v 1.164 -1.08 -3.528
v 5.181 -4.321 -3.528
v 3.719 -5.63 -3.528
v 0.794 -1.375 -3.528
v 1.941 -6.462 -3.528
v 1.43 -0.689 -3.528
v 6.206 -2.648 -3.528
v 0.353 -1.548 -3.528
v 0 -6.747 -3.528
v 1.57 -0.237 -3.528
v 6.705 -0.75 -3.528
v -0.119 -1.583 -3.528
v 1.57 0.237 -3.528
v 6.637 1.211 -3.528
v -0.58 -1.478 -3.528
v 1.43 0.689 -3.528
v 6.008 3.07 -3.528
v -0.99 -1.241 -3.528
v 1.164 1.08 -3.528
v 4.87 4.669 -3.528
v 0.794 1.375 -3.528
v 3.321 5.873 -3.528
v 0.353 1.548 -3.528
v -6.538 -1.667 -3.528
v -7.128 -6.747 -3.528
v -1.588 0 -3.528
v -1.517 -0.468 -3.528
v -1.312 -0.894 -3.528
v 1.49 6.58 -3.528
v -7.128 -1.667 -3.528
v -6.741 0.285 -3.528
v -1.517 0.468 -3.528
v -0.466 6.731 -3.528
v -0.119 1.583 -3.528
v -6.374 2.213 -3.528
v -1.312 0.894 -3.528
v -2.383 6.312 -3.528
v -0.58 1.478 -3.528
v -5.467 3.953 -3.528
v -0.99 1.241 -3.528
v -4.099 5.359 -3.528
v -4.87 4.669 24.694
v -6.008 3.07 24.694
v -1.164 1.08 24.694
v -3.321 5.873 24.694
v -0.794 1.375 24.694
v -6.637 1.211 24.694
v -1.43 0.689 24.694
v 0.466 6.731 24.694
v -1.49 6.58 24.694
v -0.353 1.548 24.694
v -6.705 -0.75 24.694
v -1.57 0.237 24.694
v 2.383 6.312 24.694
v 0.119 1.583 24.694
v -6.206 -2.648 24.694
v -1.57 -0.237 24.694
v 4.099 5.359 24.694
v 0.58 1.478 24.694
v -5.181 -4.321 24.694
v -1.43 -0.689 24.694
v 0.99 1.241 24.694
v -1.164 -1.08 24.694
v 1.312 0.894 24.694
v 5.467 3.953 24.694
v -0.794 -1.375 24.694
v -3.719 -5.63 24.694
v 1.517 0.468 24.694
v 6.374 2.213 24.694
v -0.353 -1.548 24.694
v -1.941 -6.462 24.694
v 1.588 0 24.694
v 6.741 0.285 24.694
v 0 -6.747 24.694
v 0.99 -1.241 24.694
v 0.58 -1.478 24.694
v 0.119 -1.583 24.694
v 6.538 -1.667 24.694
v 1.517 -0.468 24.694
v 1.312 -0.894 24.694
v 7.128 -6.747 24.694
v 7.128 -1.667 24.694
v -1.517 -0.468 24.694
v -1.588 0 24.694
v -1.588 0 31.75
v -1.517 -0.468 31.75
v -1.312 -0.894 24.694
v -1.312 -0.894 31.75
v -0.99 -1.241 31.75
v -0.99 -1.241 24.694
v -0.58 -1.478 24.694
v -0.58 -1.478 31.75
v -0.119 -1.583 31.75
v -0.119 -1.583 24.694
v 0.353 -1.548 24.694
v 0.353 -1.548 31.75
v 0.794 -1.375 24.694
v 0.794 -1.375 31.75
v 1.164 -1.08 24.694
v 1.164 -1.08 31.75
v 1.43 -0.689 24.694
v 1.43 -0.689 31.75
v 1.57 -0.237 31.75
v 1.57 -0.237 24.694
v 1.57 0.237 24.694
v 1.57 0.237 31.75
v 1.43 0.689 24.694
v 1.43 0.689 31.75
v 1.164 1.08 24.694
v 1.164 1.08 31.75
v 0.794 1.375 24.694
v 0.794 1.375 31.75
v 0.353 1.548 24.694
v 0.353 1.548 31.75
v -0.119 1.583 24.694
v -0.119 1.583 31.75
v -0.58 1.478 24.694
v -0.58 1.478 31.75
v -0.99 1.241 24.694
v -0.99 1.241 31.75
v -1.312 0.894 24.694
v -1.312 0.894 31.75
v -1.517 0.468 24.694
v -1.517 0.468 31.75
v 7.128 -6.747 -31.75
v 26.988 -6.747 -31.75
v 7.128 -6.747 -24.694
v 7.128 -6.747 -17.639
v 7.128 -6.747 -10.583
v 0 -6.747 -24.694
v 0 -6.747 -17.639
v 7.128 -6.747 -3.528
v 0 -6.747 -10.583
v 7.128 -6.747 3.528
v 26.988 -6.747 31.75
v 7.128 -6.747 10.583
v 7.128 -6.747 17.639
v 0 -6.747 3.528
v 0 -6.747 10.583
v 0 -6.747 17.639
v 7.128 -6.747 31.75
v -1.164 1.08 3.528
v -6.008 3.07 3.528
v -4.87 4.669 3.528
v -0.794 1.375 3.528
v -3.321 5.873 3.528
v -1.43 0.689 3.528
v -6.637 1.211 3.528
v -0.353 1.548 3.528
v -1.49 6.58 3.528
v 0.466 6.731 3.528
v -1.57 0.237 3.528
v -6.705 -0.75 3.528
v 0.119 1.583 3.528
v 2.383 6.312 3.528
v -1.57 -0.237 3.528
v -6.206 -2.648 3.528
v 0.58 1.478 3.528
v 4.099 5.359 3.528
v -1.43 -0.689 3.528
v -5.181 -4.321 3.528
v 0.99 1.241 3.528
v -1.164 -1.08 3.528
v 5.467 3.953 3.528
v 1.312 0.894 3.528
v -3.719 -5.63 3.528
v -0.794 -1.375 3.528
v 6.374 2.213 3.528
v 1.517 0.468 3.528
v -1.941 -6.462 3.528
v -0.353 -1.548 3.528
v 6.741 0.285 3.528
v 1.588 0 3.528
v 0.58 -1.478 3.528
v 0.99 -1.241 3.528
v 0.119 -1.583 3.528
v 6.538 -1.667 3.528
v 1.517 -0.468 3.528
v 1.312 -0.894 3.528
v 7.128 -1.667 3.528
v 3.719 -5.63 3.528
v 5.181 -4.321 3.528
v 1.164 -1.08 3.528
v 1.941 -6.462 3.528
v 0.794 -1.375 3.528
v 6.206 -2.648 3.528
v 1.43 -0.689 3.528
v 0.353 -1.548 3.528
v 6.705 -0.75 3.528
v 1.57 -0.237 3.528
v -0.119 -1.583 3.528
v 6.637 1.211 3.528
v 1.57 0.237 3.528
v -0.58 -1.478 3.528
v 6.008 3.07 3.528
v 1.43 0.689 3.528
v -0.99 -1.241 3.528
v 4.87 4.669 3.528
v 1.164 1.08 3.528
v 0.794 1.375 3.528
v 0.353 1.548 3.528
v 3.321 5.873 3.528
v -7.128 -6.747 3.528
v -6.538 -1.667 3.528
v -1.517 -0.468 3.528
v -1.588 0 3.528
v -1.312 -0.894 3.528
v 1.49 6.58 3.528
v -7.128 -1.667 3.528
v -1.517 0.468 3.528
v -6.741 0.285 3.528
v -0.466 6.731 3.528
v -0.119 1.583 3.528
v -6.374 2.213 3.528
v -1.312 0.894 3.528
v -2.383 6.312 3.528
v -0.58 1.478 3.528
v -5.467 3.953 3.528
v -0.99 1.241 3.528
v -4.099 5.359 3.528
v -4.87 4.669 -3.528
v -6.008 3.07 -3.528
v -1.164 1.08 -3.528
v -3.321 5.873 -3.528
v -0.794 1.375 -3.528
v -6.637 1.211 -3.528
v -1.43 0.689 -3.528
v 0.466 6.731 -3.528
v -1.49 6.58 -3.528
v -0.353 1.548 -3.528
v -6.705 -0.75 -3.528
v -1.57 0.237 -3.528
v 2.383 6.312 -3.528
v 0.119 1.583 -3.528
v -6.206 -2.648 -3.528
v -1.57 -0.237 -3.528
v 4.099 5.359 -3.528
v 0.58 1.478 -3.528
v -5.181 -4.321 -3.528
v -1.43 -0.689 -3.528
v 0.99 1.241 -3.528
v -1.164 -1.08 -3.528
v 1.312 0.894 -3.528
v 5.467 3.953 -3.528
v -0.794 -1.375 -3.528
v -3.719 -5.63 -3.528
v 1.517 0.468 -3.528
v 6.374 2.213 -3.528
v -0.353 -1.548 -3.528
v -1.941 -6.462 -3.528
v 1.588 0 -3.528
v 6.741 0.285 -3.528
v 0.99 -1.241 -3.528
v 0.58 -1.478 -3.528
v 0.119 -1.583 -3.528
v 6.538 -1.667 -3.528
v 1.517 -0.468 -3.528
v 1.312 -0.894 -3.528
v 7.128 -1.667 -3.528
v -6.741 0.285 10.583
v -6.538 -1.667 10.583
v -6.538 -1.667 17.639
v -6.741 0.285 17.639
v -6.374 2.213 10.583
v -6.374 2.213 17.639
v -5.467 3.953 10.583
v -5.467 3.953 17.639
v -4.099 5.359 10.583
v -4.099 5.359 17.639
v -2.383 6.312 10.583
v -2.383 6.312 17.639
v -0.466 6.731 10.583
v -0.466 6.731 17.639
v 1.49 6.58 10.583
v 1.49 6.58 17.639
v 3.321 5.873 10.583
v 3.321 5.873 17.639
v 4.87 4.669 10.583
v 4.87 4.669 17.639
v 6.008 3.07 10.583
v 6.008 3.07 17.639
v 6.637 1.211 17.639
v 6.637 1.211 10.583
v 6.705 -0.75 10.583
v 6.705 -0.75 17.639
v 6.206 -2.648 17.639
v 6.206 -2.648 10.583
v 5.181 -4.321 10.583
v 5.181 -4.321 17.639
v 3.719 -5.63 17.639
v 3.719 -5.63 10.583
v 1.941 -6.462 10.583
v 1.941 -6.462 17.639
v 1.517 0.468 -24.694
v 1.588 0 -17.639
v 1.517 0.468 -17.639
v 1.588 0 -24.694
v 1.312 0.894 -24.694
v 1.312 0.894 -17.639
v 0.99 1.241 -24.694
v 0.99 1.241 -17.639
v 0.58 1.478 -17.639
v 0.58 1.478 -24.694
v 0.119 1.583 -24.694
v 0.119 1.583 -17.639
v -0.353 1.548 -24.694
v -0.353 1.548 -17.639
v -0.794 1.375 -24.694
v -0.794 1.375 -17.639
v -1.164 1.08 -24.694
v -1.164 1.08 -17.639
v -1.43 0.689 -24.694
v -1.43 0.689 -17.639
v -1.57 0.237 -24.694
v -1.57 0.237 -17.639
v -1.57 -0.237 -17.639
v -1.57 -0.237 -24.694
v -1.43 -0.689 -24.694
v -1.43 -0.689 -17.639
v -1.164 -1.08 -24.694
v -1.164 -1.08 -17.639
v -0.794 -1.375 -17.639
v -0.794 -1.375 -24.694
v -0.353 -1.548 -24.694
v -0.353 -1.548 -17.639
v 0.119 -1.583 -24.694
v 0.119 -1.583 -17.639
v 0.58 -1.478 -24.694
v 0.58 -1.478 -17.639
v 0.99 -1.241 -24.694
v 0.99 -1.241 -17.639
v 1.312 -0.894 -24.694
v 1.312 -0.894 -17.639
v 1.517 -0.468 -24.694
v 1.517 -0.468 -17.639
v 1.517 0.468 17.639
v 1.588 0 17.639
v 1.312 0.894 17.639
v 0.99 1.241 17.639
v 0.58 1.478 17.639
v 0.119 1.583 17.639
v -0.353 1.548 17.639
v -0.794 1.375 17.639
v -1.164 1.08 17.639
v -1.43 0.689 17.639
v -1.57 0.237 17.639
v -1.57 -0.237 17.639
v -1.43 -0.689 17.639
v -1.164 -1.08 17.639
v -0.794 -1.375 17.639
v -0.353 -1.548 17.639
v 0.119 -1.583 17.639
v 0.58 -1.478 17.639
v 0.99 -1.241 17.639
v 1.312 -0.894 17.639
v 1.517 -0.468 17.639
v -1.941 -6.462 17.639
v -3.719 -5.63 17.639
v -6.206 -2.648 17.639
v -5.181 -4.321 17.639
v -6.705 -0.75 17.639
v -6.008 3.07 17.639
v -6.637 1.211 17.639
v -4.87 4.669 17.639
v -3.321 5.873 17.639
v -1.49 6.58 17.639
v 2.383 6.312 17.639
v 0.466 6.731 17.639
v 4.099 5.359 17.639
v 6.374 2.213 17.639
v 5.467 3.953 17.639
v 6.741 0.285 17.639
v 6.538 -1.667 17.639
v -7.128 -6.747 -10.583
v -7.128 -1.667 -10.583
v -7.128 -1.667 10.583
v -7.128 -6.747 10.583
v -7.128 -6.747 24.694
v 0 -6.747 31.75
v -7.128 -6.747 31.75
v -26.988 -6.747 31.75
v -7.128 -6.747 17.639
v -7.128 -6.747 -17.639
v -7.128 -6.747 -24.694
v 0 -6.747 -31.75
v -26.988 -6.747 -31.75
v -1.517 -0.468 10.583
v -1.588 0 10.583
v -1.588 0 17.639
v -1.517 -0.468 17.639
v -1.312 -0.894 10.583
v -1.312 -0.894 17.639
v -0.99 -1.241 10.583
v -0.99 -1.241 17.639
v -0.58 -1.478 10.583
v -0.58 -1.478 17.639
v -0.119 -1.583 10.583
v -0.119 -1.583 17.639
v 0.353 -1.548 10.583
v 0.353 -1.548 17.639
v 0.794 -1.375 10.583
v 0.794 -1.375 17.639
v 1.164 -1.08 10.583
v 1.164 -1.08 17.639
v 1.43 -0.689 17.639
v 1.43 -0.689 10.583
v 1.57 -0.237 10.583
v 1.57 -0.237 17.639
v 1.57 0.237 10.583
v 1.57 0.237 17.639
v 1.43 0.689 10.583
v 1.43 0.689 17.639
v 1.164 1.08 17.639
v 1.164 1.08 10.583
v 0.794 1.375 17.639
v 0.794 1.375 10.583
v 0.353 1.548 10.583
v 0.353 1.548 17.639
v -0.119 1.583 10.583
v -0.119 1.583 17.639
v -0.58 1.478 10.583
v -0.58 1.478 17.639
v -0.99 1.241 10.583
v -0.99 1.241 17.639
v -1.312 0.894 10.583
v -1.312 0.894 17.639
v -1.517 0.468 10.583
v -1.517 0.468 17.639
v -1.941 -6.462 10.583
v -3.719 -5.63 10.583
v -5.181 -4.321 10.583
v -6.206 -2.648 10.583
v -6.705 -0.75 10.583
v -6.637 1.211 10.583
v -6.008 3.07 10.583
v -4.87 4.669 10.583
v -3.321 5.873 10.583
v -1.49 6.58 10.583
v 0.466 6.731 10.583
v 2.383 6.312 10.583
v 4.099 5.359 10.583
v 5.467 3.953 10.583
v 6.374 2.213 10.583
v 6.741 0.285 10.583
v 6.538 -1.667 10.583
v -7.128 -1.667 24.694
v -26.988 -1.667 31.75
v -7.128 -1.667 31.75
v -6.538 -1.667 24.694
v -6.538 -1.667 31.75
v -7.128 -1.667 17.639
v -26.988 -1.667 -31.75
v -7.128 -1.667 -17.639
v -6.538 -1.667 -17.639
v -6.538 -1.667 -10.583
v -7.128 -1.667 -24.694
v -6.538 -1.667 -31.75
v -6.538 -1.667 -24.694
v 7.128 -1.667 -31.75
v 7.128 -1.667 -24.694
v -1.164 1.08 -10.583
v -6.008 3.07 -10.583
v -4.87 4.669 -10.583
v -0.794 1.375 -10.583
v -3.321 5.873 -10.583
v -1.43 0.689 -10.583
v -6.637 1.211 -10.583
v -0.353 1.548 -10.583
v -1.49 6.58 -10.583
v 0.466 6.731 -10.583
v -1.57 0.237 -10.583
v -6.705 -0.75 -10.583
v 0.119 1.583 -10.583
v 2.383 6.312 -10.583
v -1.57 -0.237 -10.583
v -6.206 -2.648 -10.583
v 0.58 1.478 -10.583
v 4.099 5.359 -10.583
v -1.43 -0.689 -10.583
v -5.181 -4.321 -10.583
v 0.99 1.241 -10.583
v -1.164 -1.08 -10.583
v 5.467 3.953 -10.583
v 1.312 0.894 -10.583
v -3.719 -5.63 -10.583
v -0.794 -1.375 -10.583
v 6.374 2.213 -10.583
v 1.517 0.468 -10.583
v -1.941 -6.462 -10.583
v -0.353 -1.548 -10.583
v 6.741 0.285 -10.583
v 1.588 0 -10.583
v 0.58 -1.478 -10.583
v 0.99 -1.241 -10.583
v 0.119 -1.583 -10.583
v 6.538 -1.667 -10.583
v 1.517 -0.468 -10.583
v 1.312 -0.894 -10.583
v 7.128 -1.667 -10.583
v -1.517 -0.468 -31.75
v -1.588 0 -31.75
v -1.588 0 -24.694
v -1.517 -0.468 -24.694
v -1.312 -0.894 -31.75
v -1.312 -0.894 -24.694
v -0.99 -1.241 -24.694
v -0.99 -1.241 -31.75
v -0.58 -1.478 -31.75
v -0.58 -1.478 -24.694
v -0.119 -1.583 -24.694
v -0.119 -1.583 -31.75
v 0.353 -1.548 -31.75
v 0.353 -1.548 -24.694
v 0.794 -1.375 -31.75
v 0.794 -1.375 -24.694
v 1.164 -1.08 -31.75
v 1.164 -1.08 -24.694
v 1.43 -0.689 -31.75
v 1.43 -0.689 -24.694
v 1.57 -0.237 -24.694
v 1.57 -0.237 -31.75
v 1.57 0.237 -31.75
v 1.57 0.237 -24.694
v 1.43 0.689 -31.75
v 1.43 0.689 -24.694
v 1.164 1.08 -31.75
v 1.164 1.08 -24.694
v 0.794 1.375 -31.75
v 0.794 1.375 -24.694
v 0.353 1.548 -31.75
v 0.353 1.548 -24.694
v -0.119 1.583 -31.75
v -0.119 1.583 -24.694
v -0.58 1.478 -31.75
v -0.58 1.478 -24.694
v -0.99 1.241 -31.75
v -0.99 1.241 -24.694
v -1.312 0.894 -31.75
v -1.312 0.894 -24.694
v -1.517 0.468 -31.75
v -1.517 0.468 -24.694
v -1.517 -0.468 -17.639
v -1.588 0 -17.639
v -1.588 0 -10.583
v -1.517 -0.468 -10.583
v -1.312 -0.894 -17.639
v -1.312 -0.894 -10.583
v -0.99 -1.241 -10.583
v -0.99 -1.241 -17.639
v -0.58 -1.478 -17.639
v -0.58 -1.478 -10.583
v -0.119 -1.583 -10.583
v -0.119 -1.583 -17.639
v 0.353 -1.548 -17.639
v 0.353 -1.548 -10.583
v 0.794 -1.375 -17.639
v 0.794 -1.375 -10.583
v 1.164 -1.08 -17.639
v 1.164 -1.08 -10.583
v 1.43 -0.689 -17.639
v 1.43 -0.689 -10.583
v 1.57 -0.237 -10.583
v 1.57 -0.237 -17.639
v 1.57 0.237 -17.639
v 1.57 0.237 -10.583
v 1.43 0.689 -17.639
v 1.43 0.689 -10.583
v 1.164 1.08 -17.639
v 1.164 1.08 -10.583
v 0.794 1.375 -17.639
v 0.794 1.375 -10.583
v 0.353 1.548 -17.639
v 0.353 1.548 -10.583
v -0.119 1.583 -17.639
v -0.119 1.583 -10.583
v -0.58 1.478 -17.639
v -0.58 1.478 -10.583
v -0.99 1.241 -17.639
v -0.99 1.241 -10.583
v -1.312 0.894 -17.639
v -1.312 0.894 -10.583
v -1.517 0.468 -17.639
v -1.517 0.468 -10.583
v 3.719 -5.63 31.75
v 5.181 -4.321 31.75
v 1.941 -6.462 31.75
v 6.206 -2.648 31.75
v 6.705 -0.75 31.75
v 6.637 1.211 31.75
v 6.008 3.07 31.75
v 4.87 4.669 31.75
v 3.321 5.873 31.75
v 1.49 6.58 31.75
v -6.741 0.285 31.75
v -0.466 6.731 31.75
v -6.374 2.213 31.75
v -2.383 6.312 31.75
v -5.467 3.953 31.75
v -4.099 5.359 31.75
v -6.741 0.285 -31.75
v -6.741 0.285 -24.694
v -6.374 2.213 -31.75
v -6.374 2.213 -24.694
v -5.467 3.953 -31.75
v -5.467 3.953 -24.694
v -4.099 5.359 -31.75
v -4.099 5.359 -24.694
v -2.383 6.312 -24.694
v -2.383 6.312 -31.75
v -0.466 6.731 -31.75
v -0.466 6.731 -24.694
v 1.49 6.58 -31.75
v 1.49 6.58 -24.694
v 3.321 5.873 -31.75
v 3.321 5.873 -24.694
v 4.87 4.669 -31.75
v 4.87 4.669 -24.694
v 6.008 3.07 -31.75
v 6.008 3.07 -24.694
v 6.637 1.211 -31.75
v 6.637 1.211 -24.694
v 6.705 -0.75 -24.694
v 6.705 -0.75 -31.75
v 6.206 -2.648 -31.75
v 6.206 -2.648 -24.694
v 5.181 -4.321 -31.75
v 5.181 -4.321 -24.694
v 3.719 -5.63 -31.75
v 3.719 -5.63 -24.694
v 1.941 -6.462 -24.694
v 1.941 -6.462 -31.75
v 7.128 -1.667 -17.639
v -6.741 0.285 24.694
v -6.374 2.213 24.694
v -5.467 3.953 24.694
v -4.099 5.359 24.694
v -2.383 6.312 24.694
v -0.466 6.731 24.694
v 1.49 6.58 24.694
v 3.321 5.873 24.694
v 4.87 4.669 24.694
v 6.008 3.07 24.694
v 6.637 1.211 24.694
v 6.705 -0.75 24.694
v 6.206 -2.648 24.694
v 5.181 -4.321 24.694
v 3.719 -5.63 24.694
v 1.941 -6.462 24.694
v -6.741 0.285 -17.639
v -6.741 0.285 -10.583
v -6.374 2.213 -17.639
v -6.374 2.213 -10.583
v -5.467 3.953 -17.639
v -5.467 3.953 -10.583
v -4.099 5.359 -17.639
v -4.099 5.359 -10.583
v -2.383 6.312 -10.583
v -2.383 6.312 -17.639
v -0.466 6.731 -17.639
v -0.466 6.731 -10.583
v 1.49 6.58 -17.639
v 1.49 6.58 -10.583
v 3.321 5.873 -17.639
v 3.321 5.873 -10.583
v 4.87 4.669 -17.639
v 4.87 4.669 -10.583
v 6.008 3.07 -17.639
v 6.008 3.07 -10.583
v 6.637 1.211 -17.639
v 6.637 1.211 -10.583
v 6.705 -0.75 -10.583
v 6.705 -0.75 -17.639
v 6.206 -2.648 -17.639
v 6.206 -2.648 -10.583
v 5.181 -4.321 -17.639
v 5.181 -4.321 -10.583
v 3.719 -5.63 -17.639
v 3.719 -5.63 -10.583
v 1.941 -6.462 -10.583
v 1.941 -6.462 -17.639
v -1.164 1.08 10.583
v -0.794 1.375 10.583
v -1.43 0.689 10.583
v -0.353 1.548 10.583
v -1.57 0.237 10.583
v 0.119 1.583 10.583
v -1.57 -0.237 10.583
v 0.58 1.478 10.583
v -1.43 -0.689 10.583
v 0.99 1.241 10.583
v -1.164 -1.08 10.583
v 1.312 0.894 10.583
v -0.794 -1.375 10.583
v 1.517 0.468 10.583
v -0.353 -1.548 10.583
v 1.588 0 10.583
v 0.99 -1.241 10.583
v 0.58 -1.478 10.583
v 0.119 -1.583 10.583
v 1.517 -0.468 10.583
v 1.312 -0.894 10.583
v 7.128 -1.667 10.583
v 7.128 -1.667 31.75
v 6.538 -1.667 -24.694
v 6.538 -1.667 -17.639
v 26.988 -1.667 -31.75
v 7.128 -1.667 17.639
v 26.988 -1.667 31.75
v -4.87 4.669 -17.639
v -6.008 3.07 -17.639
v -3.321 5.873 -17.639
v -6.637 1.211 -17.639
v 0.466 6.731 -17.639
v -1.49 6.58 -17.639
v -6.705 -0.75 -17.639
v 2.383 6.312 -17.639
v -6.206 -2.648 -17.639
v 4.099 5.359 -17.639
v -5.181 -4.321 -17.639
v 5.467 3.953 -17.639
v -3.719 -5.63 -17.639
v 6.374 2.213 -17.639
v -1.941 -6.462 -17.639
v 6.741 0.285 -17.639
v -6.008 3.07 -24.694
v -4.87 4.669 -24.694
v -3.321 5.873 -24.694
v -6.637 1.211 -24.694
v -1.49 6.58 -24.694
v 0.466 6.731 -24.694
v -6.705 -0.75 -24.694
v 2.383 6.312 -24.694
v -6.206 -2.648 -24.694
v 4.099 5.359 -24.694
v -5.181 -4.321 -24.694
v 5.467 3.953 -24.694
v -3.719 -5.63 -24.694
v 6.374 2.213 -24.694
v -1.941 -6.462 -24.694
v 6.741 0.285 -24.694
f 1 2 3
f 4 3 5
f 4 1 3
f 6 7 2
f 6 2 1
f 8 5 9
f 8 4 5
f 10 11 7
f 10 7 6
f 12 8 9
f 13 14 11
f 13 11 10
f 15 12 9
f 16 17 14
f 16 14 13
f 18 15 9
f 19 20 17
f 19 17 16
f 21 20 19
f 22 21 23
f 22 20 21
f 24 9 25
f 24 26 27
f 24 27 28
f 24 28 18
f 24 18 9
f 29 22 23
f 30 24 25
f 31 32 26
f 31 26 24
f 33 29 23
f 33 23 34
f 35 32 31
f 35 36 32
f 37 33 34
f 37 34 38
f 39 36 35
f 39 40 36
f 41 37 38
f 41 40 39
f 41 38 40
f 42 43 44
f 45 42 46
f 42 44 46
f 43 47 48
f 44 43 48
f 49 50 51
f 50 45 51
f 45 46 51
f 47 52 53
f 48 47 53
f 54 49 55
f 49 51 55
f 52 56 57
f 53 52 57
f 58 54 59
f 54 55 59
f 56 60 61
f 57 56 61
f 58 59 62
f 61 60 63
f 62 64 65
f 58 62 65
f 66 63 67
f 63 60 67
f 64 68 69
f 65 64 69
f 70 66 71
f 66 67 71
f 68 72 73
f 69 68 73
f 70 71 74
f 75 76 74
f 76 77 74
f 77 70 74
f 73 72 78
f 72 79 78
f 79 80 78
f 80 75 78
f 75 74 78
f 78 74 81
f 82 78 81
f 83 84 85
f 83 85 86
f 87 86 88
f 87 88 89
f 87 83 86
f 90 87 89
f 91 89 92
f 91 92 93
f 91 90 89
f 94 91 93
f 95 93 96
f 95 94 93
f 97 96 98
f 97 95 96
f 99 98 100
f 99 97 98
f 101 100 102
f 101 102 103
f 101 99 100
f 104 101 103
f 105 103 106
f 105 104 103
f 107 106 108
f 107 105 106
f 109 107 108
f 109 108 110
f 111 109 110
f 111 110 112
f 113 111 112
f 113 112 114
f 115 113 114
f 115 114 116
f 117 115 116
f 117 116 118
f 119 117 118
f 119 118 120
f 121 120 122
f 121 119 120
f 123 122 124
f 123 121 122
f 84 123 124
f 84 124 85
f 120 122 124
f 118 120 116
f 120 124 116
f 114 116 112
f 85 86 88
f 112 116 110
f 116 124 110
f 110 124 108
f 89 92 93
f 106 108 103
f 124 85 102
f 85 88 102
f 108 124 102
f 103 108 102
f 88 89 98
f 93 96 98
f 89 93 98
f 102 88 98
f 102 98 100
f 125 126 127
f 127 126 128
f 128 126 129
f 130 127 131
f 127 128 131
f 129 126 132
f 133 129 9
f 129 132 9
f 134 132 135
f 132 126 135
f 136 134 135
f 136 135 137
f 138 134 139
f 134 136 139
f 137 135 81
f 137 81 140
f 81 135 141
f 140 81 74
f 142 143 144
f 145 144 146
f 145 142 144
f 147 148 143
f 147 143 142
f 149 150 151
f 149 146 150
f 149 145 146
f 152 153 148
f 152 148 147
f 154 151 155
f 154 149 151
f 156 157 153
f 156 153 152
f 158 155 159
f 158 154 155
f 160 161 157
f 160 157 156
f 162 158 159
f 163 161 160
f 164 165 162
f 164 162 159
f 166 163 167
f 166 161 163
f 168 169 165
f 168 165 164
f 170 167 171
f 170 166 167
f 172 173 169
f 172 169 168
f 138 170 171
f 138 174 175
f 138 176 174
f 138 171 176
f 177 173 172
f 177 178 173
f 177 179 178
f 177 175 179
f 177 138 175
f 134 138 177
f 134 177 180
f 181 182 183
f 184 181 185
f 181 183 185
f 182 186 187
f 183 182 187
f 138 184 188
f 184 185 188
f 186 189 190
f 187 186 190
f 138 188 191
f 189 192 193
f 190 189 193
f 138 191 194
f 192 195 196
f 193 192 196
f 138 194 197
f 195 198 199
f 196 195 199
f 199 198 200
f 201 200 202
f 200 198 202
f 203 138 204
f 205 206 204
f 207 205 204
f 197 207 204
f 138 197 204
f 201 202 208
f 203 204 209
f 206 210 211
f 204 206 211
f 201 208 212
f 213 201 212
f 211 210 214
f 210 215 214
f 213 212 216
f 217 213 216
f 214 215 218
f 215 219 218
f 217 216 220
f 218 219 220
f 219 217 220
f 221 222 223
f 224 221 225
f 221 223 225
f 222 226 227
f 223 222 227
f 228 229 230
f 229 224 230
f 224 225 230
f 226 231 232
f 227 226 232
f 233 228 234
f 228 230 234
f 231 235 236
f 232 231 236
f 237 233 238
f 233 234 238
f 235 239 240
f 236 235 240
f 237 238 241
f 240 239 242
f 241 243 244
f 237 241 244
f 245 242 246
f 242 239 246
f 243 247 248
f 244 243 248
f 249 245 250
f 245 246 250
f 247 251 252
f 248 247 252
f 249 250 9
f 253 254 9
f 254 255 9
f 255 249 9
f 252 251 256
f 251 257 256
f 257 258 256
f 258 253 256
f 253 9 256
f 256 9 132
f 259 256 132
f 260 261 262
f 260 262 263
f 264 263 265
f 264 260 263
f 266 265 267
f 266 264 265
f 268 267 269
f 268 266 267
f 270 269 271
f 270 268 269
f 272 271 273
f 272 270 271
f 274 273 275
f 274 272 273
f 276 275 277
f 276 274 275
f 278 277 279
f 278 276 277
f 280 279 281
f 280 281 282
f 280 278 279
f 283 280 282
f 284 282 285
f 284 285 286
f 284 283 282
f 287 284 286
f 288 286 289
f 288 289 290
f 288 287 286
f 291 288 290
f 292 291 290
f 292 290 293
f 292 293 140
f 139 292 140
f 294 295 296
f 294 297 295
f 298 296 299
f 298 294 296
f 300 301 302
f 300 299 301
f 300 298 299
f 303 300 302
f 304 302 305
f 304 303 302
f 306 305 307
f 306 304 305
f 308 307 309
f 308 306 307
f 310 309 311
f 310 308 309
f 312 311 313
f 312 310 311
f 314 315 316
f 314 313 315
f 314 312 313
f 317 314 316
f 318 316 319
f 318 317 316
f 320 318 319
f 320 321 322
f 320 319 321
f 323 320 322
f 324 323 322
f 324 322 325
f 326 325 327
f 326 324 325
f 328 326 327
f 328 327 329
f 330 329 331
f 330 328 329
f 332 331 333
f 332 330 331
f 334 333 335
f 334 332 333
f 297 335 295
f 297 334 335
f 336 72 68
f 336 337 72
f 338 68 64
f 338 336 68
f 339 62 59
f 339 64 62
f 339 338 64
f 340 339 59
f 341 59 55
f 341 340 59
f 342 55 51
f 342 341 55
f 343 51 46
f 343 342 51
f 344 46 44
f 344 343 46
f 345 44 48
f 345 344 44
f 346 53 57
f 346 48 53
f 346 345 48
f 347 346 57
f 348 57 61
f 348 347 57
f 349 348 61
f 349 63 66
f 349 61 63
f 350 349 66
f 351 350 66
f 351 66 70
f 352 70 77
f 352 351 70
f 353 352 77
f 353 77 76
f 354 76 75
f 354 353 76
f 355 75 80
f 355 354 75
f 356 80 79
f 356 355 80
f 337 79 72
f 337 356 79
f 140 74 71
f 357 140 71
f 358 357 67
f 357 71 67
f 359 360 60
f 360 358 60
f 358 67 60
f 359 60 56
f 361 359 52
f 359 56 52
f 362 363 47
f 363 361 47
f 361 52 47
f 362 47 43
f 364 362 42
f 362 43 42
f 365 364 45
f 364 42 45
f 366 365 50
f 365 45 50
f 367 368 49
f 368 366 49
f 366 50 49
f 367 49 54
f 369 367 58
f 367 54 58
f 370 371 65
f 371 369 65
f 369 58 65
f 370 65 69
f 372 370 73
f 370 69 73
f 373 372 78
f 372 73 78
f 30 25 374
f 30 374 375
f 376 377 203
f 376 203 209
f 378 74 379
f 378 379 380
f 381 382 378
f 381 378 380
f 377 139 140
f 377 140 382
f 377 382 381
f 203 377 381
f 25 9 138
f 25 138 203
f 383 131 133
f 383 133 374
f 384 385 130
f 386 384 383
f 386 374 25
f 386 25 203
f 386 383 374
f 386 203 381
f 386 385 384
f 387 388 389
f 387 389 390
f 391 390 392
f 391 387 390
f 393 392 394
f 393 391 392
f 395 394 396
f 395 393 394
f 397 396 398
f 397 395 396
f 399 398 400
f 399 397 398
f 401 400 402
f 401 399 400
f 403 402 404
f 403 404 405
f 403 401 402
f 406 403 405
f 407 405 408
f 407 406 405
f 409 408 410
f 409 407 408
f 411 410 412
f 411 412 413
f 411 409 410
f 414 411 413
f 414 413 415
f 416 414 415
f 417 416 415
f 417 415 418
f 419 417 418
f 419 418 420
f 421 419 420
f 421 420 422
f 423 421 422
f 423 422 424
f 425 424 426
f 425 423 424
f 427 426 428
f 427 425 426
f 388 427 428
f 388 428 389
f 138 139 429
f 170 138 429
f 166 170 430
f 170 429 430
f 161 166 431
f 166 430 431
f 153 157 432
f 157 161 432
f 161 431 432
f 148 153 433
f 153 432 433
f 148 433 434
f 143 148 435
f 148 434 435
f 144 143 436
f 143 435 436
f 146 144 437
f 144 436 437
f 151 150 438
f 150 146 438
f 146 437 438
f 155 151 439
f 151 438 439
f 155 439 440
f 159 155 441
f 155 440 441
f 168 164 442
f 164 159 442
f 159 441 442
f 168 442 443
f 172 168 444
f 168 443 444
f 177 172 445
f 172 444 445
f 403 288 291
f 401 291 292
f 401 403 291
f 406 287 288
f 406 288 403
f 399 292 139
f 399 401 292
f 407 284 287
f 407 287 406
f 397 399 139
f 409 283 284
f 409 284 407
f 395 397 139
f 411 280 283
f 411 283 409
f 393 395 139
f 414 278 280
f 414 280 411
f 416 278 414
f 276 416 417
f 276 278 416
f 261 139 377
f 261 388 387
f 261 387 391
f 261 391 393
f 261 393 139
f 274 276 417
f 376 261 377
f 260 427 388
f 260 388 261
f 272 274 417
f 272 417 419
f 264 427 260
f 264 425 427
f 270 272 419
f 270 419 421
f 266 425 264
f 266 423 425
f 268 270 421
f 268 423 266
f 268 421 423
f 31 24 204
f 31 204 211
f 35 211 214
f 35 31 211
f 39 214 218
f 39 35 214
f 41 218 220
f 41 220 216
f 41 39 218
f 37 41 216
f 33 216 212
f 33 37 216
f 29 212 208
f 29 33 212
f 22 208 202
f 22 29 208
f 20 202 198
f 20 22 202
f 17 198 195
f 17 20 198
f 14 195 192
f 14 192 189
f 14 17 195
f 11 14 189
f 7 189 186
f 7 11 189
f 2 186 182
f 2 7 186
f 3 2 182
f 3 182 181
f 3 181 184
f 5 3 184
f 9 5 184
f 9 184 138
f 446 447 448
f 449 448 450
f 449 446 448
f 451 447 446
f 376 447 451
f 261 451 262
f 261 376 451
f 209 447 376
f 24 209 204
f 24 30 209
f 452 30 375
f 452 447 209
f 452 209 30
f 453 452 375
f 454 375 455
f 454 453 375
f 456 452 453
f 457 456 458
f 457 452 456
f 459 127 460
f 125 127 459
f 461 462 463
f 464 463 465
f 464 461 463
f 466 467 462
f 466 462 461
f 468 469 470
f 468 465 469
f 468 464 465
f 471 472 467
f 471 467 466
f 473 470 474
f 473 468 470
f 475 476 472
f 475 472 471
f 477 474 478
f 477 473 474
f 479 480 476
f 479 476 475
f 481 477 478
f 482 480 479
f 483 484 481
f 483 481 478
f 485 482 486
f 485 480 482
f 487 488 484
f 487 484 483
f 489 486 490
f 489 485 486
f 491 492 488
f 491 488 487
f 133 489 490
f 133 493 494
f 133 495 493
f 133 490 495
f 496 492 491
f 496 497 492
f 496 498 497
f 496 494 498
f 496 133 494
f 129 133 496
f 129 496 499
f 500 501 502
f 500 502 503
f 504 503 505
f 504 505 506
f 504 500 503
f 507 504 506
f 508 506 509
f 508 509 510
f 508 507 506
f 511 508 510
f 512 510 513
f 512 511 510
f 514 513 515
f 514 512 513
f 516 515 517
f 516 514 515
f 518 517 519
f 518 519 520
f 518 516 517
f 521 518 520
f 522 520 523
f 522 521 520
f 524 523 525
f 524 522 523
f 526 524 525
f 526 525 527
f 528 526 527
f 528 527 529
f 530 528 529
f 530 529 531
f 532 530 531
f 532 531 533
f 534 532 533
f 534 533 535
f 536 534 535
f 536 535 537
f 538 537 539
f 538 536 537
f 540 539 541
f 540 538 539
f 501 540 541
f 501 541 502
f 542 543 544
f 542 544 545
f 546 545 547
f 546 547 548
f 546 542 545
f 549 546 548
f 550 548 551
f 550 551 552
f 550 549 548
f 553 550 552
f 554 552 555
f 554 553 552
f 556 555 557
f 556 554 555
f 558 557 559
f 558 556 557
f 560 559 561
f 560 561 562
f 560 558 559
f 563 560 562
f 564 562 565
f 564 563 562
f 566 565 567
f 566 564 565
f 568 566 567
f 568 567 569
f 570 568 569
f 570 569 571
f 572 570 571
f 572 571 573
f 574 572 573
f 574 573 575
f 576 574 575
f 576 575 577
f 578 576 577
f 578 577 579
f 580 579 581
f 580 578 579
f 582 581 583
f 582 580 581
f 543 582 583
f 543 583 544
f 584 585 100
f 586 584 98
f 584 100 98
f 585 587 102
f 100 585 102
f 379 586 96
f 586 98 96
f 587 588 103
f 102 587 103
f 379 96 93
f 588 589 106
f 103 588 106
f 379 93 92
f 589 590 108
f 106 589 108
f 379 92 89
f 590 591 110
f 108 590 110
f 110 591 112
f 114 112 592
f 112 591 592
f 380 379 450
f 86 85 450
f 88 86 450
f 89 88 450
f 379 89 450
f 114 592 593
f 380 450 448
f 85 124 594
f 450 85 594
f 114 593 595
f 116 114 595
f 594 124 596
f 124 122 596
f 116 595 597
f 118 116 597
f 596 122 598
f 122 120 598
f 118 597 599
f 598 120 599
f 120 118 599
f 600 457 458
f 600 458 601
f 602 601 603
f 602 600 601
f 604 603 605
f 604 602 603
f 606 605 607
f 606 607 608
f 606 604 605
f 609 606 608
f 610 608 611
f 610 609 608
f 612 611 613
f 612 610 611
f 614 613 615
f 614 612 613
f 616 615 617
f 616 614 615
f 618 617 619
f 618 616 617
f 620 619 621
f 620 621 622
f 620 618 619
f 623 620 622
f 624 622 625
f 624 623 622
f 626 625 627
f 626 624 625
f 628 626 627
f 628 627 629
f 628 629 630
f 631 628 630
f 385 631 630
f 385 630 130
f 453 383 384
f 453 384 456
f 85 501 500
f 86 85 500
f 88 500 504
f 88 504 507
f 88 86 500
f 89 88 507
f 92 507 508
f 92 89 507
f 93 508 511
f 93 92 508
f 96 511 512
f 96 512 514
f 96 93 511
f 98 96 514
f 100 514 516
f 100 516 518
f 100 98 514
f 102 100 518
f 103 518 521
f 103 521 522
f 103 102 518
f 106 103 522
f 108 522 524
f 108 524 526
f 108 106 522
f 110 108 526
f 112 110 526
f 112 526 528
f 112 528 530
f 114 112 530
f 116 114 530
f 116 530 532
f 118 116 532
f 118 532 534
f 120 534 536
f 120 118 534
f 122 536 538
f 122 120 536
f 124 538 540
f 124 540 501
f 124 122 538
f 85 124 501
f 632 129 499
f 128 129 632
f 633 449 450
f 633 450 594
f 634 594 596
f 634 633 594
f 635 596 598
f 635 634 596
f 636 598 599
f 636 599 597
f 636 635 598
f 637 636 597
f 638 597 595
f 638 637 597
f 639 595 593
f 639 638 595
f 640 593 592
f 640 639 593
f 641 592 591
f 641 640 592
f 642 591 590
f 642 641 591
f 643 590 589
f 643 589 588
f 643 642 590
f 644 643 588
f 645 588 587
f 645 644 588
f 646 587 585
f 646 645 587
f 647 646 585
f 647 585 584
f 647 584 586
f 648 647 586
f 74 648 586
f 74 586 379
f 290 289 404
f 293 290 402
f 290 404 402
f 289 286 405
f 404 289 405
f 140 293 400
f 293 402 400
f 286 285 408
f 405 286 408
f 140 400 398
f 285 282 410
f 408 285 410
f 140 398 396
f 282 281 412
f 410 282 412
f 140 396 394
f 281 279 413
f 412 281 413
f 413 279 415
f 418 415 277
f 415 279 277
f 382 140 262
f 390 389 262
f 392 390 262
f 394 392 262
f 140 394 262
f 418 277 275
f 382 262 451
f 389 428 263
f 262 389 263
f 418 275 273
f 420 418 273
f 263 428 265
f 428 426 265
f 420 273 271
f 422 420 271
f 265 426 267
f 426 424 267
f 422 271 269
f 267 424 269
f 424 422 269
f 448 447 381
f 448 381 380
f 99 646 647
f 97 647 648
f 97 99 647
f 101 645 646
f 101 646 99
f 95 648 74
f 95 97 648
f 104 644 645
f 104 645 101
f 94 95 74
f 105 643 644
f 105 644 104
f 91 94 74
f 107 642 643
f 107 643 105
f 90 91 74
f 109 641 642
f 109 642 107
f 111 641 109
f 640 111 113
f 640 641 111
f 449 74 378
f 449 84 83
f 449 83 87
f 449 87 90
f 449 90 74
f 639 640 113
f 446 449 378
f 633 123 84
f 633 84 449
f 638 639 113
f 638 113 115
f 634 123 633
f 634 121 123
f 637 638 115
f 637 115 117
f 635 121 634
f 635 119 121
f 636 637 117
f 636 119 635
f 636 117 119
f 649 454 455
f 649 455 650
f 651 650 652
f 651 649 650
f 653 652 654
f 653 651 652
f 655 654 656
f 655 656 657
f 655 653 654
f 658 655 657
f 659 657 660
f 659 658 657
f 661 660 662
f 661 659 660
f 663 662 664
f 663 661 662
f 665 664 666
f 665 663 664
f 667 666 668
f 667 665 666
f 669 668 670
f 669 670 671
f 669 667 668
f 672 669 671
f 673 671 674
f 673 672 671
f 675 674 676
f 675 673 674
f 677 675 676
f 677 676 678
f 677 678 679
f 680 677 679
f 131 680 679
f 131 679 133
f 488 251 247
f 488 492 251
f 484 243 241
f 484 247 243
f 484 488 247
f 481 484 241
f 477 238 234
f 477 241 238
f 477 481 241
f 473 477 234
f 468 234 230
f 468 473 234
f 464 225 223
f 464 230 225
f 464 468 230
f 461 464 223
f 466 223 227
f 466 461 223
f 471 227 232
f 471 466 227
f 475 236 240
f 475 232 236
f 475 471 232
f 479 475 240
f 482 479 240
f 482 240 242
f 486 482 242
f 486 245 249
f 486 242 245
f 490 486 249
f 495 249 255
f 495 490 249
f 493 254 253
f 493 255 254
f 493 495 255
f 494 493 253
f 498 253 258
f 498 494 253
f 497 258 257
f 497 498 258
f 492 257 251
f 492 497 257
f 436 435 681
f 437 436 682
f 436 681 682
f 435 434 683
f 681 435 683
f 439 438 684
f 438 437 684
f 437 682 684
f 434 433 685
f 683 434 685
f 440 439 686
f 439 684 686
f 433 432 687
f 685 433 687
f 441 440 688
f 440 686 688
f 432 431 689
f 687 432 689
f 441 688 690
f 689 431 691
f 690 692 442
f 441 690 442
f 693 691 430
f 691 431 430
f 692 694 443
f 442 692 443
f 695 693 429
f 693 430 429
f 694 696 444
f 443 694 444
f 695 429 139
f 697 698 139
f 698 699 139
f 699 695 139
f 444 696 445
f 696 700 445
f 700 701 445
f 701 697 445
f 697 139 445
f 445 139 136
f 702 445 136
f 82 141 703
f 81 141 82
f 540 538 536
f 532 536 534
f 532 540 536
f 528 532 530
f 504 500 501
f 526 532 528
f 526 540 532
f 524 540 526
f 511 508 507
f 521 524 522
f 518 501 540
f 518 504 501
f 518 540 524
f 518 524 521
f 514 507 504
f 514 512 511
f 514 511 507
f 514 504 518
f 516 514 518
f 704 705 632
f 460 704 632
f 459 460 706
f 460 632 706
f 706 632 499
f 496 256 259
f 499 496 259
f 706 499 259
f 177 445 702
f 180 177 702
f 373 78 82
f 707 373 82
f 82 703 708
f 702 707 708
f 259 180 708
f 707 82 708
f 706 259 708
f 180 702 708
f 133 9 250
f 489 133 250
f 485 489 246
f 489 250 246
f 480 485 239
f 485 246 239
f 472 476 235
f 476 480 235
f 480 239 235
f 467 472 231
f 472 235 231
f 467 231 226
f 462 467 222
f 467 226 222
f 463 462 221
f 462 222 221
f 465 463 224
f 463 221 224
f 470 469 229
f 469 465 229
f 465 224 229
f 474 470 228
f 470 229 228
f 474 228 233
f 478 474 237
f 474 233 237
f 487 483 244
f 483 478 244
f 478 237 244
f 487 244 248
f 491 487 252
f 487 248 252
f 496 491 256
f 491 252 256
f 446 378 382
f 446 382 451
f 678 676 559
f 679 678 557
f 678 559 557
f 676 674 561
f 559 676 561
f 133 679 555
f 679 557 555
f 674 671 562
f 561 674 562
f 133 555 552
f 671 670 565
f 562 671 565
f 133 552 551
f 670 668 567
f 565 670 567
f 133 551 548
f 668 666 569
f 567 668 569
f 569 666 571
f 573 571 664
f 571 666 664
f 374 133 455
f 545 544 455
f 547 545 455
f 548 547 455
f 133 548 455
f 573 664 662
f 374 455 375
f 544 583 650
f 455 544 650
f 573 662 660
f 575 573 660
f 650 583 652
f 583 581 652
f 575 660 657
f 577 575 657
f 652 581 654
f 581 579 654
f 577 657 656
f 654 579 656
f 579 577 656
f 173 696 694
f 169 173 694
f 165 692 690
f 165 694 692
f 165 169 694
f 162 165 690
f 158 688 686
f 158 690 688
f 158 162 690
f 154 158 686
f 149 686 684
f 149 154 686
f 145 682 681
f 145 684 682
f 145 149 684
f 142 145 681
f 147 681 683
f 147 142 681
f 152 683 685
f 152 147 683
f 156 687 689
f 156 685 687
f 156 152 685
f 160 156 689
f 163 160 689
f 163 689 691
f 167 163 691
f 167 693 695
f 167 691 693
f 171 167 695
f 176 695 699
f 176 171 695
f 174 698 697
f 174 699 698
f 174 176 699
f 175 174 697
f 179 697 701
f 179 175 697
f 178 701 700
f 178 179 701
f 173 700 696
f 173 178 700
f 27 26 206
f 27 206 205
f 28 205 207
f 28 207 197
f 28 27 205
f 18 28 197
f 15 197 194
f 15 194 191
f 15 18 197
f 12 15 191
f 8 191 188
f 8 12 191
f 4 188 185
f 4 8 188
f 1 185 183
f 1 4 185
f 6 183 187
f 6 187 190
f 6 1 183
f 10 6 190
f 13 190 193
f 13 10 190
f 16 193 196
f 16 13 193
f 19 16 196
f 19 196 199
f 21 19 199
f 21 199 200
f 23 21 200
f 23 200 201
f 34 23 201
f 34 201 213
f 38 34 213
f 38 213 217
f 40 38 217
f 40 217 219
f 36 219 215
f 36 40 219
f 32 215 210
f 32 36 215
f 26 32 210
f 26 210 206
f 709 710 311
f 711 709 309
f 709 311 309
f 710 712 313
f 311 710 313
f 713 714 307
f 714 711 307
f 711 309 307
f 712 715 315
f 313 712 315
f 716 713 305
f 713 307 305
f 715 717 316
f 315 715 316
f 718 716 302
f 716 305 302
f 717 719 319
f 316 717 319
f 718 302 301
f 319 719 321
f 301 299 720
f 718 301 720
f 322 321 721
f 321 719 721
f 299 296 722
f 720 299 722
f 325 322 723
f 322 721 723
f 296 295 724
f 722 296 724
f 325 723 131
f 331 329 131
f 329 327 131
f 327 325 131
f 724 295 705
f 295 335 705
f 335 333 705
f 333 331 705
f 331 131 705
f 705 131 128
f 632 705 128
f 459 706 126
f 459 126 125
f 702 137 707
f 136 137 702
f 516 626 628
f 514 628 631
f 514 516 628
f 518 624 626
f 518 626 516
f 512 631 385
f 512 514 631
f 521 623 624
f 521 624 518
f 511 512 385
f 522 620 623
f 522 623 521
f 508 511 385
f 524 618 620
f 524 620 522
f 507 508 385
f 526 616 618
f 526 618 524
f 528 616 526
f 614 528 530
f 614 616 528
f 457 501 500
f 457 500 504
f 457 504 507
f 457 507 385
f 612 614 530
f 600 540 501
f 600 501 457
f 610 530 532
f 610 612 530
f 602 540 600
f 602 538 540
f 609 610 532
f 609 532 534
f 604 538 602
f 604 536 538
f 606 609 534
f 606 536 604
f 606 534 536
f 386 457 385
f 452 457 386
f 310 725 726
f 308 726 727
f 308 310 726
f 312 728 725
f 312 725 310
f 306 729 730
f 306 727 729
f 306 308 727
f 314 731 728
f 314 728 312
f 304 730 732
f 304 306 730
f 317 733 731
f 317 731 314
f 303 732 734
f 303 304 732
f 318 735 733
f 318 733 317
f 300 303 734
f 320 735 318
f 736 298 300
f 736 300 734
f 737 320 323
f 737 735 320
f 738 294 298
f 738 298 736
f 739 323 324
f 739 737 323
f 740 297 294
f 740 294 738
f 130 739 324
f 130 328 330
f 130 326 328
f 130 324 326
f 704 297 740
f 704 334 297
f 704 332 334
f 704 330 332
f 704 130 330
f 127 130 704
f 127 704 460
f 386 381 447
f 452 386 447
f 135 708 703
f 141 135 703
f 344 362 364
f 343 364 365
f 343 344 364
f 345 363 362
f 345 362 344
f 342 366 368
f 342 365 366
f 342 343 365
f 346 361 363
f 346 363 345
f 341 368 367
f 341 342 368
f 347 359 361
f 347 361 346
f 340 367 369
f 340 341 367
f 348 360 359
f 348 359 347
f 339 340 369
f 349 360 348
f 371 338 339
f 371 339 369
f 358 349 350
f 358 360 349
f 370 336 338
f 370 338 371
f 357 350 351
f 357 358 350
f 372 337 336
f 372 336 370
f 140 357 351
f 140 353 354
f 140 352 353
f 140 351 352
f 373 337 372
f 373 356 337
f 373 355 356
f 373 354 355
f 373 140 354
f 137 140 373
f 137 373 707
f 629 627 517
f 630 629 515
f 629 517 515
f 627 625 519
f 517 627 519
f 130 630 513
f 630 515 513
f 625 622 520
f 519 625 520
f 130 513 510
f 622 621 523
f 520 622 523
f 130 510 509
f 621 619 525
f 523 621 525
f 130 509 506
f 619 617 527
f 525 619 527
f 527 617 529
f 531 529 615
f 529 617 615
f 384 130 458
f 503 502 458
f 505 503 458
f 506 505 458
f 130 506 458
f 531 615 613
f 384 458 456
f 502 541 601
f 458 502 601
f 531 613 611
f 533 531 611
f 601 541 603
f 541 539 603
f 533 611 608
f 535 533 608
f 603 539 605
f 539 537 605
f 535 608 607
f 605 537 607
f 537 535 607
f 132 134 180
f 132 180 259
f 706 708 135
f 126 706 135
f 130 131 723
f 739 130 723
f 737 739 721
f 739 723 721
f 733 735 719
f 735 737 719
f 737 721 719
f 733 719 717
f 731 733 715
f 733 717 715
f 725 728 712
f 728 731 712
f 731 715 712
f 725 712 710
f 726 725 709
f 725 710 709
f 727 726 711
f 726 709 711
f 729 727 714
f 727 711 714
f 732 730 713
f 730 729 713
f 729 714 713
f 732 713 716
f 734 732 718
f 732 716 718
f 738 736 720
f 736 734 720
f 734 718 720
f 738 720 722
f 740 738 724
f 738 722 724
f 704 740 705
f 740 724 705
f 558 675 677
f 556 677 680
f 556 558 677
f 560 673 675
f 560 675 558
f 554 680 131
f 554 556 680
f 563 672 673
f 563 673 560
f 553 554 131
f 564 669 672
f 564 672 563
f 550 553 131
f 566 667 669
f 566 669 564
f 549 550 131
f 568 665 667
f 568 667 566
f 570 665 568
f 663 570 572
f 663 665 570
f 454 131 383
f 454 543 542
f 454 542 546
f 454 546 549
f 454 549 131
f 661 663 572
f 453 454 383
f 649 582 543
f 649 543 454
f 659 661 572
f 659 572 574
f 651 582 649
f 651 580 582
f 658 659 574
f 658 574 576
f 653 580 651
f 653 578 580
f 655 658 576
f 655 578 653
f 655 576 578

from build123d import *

# Parameters (mm, degrees)
SKETCH1_R               = 1.5875
EXTRUDE1_DEPTH          = 31.75
SKETCH1_W               = 19.859625
SKETCH1_H               = 5.08
EXTRUDE1_2_DEPTH        = 31.75
EXTRUDE24_DEPTH         = 45.185664218
EXTRUDE24_DEPTH_BACK    = 45.185664218
SKETCH20_W              = 14.25575
SKETCH20_H              = 7.055555556
SKETCH21_R              = 1.5875
EXTRUDE25_DEPTH         = 7.055555556
EXTRUDE26_START         = 14.11111
SKETCH21_2_R            = 1.5875
EXTRUDE26_DEPTH         = 7.055555556
EXTRUDE27_START         = 28.22222
SKETCH21_3_R            = 1.5875
EXTRUDE27_DEPTH         = 7.055555556
EXTRUDE28_START         = 42.33333
SKETCH21_4_R            = 1.5875
EXTRUDE28_DEPTH         = 7.055555556
EXTRUDE29_START         = 56.44444
SKETCH21_5_R            = 1.5875
EXTRUDE29_DEPTH         = 7.055555556
CUT_EXTRUDE2_DEPTH      = 45.185664218
CUT_EXTRUDE2_DEPTH_BACK = 45.185664218
SKETCH22_W              = 8.334375
SKETCH22_H              = 2.5796875


with BuildPart() as part:
    # Sketch1 → Extrude1 (new, symmetric)
    with BuildSketch(Plane.XY):
        with BuildLine():
            Line((26.9875, -6.746875), (0, -6.746875))
            ThreePointArc((0, -6.746875), (-4.139693527, 5.327594182), (6.53772514, -1.666875))
            Line((6.53772514, -1.666875), (26.9875, -1.666875))
            Line((26.9875, -1.666875), (26.9875, -6.746875))
        make_face()
        Circle(SKETCH1_R, mode=Mode.SUBTRACT)
    extrude(amount=EXTRUDE1_DEPTH, both=True)

    # Sketch20 → Extrude24 (cut, two sides: drawn at the far end of the back side and taken through both)
    with BuildSketch(Plane(origin=(0, 0, 0), x_dir=(1, 0, 0), z_dir=(0, 1, 0)).offset(-EXTRUDE24_DEPTH_BACK)):
        with Locations((0, 28.222222222)):
            Rectangle(SKETCH20_W, SKETCH20_H)
        with Locations((0, 14.111111111)):
            Rectangle(SKETCH20_W, SKETCH20_H)
        Rectangle(SKETCH20_W, SKETCH20_H)
        with Locations((0, -14.111111111)):
            Rectangle(SKETCH20_W, SKETCH20_H)
        with Locations((0, -28.222222222)):
            Rectangle(SKETCH20_W, SKETCH20_H)
    extrude(amount=EXTRUDE24_DEPTH + EXTRUDE24_DEPTH_BACK, mode=Mode.SUBTRACT)


with BuildPart() as body_2:
    # Sketch1 → Extrude1 2 (new, symmetric)
    with BuildSketch(Plane.XY):
        with Locations((-17.0576875, -4.206875)):
            Rectangle(SKETCH1_W, SKETCH1_H)
    extrude(amount=EXTRUDE1_2_DEPTH, both=True)

    # Sketch21 → Extrude25 (add)
    with BuildSketch(Plane.XY.offset(-31.75)):
        with BuildLine():
            Line((-7.127875, -1.666875), (-6.53772514, -1.666875))
            ThreePointArc((-6.53772514, -1.666875), (4.139693527, 5.327594182), (0, -6.746875))
            Line((0, -6.746875), (-7.127875, -6.746875))
            Line((-7.127875, -6.746875), (-7.127875, -1.666875))
        make_face()
        with Locations(Location((0, 0, 0), (0, 0, 180))):
            Circle(SKETCH21_R, mode=Mode.SUBTRACT)
    extrude(amount=EXTRUDE25_DEPTH)

    # Sketch21<2> → Extrude26 (add)
    with BuildSketch(Plane.XY.offset(-31.75).offset(EXTRUDE26_START)):
        with BuildLine():
            Line((-7.127875, -1.666875), (-6.53772514, -1.666875))
            ThreePointArc((-6.53772514, -1.666875), (4.139693527, 5.327594182), (0, -6.746875))
            Line((0, -6.746875), (-7.127875, -6.746875))
            Line((-7.127875, -6.746875), (-7.127875, -1.666875))
        make_face()
        with Locations(Location((0, 0, 0), (0, 0, 180))):
            Circle(SKETCH21_2_R, mode=Mode.SUBTRACT)
    extrude(amount=EXTRUDE26_DEPTH)

    # Sketch21<3> → Extrude27 (add)
    with BuildSketch(Plane.XY.offset(-31.75).offset(EXTRUDE27_START)):
        with BuildLine():
            Line((-7.127875, -1.666875), (-6.53772514, -1.666875))
            ThreePointArc((-6.53772514, -1.666875), (4.139693527, 5.327594182), (0, -6.746875))
            Line((0, -6.746875), (-7.127875, -6.746875))
            Line((-7.127875, -6.746875), (-7.127875, -1.666875))
        make_face()
        with Locations(Location((0, 0, 0), (0, 0, 180))):
            Circle(SKETCH21_3_R, mode=Mode.SUBTRACT)
    extrude(amount=EXTRUDE27_DEPTH)

    # Sketch21<4> → Extrude28 (add)
    with BuildSketch(Plane.XY.offset(-31.75).offset(EXTRUDE28_START)):
        with BuildLine():
            Line((-7.127875, -1.666875), (-6.53772514, -1.666875))
            ThreePointArc((-6.53772514, -1.666875), (4.139693527, 5.327594182), (0, -6.746875))
            Line((0, -6.746875), (-7.127875, -6.746875))
            Line((-7.127875, -6.746875), (-7.127875, -1.666875))
        make_face()
        with Locations(Location((0, 0, 0), (0, 0, 180))):
            Circle(SKETCH21_4_R, mode=Mode.SUBTRACT)
    extrude(amount=EXTRUDE28_DEPTH)

    # Sketch21<5> → Extrude29 (add)
    with BuildSketch(Plane.XY.offset(-31.75).offset(EXTRUDE29_START)):
        with BuildLine():
            Line((-7.127875, -1.666875), (-6.53772514, -1.666875))
            ThreePointArc((-6.53772514, -1.666875), (4.139693527, 5.327594182), (0, -6.746875))
            Line((0, -6.746875), (-7.127875, -6.746875))
            Line((-7.127875, -6.746875), (-7.127875, -1.666875))
        make_face()
        with Locations(Location((0, 0, 0), (0, 0, 180))):
            Circle(SKETCH21_5_R, mode=Mode.SUBTRACT)
    extrude(amount=EXTRUDE29_DEPTH)


with BuildPart() as body_3:
    # Sketch6 → Revolve1 (revolve)
    with BuildSketch(Plane(origin=(0, 0, 0), x_dir=(1, 0, 0), z_dir=(0, 1, 0))):
        with BuildLine():
            Line((-4.1671875, 31.75), (-1.5875, 31.75))
            Line((-1.5875, 31.75), (-1.5875, -31.75))
            Line((-1.5875, -31.75), (-4.1671875, -31.75))
            ThreePointArc((-4.1671875, -31.75), (-2.450522355, -33.632574574), (0, -34.3296875))
            Line((0, -34.3296875), (0, 34.3296875))
            ThreePointArc((0, 34.3296875), (-2.450522355, 33.632574574), (-4.1671875, 31.75))
        make_face()
    revolve(axis=Axis((0, 0, -34.3296875), (0, 0, 1)))

    # Sketch22 → Cut-Extrude2 (cut, two sides: drawn at the far end of the back side and taken through both)
    with BuildSketch(Plane(origin=(0, 0, 0), x_dir=(1, 0, 0), z_dir=(0, 1, 0)).offset(-CUT_EXTRUDE2_DEPTH_BACK)):
        with Locations((0, 33.03984375)):
            Rectangle(SKETCH22_W, SKETCH22_H)
        with Locations((0, -33.03984375)):
            Rectangle(SKETCH22_W, SKETCH22_H)
    extrude(amount=CUT_EXTRUDE2_DEPTH + CUT_EXTRUDE2_DEPTH_BACK, mode=Mode.SUBTRACT)


solid = Compound([part.part, body_2.part, body_3.part])
